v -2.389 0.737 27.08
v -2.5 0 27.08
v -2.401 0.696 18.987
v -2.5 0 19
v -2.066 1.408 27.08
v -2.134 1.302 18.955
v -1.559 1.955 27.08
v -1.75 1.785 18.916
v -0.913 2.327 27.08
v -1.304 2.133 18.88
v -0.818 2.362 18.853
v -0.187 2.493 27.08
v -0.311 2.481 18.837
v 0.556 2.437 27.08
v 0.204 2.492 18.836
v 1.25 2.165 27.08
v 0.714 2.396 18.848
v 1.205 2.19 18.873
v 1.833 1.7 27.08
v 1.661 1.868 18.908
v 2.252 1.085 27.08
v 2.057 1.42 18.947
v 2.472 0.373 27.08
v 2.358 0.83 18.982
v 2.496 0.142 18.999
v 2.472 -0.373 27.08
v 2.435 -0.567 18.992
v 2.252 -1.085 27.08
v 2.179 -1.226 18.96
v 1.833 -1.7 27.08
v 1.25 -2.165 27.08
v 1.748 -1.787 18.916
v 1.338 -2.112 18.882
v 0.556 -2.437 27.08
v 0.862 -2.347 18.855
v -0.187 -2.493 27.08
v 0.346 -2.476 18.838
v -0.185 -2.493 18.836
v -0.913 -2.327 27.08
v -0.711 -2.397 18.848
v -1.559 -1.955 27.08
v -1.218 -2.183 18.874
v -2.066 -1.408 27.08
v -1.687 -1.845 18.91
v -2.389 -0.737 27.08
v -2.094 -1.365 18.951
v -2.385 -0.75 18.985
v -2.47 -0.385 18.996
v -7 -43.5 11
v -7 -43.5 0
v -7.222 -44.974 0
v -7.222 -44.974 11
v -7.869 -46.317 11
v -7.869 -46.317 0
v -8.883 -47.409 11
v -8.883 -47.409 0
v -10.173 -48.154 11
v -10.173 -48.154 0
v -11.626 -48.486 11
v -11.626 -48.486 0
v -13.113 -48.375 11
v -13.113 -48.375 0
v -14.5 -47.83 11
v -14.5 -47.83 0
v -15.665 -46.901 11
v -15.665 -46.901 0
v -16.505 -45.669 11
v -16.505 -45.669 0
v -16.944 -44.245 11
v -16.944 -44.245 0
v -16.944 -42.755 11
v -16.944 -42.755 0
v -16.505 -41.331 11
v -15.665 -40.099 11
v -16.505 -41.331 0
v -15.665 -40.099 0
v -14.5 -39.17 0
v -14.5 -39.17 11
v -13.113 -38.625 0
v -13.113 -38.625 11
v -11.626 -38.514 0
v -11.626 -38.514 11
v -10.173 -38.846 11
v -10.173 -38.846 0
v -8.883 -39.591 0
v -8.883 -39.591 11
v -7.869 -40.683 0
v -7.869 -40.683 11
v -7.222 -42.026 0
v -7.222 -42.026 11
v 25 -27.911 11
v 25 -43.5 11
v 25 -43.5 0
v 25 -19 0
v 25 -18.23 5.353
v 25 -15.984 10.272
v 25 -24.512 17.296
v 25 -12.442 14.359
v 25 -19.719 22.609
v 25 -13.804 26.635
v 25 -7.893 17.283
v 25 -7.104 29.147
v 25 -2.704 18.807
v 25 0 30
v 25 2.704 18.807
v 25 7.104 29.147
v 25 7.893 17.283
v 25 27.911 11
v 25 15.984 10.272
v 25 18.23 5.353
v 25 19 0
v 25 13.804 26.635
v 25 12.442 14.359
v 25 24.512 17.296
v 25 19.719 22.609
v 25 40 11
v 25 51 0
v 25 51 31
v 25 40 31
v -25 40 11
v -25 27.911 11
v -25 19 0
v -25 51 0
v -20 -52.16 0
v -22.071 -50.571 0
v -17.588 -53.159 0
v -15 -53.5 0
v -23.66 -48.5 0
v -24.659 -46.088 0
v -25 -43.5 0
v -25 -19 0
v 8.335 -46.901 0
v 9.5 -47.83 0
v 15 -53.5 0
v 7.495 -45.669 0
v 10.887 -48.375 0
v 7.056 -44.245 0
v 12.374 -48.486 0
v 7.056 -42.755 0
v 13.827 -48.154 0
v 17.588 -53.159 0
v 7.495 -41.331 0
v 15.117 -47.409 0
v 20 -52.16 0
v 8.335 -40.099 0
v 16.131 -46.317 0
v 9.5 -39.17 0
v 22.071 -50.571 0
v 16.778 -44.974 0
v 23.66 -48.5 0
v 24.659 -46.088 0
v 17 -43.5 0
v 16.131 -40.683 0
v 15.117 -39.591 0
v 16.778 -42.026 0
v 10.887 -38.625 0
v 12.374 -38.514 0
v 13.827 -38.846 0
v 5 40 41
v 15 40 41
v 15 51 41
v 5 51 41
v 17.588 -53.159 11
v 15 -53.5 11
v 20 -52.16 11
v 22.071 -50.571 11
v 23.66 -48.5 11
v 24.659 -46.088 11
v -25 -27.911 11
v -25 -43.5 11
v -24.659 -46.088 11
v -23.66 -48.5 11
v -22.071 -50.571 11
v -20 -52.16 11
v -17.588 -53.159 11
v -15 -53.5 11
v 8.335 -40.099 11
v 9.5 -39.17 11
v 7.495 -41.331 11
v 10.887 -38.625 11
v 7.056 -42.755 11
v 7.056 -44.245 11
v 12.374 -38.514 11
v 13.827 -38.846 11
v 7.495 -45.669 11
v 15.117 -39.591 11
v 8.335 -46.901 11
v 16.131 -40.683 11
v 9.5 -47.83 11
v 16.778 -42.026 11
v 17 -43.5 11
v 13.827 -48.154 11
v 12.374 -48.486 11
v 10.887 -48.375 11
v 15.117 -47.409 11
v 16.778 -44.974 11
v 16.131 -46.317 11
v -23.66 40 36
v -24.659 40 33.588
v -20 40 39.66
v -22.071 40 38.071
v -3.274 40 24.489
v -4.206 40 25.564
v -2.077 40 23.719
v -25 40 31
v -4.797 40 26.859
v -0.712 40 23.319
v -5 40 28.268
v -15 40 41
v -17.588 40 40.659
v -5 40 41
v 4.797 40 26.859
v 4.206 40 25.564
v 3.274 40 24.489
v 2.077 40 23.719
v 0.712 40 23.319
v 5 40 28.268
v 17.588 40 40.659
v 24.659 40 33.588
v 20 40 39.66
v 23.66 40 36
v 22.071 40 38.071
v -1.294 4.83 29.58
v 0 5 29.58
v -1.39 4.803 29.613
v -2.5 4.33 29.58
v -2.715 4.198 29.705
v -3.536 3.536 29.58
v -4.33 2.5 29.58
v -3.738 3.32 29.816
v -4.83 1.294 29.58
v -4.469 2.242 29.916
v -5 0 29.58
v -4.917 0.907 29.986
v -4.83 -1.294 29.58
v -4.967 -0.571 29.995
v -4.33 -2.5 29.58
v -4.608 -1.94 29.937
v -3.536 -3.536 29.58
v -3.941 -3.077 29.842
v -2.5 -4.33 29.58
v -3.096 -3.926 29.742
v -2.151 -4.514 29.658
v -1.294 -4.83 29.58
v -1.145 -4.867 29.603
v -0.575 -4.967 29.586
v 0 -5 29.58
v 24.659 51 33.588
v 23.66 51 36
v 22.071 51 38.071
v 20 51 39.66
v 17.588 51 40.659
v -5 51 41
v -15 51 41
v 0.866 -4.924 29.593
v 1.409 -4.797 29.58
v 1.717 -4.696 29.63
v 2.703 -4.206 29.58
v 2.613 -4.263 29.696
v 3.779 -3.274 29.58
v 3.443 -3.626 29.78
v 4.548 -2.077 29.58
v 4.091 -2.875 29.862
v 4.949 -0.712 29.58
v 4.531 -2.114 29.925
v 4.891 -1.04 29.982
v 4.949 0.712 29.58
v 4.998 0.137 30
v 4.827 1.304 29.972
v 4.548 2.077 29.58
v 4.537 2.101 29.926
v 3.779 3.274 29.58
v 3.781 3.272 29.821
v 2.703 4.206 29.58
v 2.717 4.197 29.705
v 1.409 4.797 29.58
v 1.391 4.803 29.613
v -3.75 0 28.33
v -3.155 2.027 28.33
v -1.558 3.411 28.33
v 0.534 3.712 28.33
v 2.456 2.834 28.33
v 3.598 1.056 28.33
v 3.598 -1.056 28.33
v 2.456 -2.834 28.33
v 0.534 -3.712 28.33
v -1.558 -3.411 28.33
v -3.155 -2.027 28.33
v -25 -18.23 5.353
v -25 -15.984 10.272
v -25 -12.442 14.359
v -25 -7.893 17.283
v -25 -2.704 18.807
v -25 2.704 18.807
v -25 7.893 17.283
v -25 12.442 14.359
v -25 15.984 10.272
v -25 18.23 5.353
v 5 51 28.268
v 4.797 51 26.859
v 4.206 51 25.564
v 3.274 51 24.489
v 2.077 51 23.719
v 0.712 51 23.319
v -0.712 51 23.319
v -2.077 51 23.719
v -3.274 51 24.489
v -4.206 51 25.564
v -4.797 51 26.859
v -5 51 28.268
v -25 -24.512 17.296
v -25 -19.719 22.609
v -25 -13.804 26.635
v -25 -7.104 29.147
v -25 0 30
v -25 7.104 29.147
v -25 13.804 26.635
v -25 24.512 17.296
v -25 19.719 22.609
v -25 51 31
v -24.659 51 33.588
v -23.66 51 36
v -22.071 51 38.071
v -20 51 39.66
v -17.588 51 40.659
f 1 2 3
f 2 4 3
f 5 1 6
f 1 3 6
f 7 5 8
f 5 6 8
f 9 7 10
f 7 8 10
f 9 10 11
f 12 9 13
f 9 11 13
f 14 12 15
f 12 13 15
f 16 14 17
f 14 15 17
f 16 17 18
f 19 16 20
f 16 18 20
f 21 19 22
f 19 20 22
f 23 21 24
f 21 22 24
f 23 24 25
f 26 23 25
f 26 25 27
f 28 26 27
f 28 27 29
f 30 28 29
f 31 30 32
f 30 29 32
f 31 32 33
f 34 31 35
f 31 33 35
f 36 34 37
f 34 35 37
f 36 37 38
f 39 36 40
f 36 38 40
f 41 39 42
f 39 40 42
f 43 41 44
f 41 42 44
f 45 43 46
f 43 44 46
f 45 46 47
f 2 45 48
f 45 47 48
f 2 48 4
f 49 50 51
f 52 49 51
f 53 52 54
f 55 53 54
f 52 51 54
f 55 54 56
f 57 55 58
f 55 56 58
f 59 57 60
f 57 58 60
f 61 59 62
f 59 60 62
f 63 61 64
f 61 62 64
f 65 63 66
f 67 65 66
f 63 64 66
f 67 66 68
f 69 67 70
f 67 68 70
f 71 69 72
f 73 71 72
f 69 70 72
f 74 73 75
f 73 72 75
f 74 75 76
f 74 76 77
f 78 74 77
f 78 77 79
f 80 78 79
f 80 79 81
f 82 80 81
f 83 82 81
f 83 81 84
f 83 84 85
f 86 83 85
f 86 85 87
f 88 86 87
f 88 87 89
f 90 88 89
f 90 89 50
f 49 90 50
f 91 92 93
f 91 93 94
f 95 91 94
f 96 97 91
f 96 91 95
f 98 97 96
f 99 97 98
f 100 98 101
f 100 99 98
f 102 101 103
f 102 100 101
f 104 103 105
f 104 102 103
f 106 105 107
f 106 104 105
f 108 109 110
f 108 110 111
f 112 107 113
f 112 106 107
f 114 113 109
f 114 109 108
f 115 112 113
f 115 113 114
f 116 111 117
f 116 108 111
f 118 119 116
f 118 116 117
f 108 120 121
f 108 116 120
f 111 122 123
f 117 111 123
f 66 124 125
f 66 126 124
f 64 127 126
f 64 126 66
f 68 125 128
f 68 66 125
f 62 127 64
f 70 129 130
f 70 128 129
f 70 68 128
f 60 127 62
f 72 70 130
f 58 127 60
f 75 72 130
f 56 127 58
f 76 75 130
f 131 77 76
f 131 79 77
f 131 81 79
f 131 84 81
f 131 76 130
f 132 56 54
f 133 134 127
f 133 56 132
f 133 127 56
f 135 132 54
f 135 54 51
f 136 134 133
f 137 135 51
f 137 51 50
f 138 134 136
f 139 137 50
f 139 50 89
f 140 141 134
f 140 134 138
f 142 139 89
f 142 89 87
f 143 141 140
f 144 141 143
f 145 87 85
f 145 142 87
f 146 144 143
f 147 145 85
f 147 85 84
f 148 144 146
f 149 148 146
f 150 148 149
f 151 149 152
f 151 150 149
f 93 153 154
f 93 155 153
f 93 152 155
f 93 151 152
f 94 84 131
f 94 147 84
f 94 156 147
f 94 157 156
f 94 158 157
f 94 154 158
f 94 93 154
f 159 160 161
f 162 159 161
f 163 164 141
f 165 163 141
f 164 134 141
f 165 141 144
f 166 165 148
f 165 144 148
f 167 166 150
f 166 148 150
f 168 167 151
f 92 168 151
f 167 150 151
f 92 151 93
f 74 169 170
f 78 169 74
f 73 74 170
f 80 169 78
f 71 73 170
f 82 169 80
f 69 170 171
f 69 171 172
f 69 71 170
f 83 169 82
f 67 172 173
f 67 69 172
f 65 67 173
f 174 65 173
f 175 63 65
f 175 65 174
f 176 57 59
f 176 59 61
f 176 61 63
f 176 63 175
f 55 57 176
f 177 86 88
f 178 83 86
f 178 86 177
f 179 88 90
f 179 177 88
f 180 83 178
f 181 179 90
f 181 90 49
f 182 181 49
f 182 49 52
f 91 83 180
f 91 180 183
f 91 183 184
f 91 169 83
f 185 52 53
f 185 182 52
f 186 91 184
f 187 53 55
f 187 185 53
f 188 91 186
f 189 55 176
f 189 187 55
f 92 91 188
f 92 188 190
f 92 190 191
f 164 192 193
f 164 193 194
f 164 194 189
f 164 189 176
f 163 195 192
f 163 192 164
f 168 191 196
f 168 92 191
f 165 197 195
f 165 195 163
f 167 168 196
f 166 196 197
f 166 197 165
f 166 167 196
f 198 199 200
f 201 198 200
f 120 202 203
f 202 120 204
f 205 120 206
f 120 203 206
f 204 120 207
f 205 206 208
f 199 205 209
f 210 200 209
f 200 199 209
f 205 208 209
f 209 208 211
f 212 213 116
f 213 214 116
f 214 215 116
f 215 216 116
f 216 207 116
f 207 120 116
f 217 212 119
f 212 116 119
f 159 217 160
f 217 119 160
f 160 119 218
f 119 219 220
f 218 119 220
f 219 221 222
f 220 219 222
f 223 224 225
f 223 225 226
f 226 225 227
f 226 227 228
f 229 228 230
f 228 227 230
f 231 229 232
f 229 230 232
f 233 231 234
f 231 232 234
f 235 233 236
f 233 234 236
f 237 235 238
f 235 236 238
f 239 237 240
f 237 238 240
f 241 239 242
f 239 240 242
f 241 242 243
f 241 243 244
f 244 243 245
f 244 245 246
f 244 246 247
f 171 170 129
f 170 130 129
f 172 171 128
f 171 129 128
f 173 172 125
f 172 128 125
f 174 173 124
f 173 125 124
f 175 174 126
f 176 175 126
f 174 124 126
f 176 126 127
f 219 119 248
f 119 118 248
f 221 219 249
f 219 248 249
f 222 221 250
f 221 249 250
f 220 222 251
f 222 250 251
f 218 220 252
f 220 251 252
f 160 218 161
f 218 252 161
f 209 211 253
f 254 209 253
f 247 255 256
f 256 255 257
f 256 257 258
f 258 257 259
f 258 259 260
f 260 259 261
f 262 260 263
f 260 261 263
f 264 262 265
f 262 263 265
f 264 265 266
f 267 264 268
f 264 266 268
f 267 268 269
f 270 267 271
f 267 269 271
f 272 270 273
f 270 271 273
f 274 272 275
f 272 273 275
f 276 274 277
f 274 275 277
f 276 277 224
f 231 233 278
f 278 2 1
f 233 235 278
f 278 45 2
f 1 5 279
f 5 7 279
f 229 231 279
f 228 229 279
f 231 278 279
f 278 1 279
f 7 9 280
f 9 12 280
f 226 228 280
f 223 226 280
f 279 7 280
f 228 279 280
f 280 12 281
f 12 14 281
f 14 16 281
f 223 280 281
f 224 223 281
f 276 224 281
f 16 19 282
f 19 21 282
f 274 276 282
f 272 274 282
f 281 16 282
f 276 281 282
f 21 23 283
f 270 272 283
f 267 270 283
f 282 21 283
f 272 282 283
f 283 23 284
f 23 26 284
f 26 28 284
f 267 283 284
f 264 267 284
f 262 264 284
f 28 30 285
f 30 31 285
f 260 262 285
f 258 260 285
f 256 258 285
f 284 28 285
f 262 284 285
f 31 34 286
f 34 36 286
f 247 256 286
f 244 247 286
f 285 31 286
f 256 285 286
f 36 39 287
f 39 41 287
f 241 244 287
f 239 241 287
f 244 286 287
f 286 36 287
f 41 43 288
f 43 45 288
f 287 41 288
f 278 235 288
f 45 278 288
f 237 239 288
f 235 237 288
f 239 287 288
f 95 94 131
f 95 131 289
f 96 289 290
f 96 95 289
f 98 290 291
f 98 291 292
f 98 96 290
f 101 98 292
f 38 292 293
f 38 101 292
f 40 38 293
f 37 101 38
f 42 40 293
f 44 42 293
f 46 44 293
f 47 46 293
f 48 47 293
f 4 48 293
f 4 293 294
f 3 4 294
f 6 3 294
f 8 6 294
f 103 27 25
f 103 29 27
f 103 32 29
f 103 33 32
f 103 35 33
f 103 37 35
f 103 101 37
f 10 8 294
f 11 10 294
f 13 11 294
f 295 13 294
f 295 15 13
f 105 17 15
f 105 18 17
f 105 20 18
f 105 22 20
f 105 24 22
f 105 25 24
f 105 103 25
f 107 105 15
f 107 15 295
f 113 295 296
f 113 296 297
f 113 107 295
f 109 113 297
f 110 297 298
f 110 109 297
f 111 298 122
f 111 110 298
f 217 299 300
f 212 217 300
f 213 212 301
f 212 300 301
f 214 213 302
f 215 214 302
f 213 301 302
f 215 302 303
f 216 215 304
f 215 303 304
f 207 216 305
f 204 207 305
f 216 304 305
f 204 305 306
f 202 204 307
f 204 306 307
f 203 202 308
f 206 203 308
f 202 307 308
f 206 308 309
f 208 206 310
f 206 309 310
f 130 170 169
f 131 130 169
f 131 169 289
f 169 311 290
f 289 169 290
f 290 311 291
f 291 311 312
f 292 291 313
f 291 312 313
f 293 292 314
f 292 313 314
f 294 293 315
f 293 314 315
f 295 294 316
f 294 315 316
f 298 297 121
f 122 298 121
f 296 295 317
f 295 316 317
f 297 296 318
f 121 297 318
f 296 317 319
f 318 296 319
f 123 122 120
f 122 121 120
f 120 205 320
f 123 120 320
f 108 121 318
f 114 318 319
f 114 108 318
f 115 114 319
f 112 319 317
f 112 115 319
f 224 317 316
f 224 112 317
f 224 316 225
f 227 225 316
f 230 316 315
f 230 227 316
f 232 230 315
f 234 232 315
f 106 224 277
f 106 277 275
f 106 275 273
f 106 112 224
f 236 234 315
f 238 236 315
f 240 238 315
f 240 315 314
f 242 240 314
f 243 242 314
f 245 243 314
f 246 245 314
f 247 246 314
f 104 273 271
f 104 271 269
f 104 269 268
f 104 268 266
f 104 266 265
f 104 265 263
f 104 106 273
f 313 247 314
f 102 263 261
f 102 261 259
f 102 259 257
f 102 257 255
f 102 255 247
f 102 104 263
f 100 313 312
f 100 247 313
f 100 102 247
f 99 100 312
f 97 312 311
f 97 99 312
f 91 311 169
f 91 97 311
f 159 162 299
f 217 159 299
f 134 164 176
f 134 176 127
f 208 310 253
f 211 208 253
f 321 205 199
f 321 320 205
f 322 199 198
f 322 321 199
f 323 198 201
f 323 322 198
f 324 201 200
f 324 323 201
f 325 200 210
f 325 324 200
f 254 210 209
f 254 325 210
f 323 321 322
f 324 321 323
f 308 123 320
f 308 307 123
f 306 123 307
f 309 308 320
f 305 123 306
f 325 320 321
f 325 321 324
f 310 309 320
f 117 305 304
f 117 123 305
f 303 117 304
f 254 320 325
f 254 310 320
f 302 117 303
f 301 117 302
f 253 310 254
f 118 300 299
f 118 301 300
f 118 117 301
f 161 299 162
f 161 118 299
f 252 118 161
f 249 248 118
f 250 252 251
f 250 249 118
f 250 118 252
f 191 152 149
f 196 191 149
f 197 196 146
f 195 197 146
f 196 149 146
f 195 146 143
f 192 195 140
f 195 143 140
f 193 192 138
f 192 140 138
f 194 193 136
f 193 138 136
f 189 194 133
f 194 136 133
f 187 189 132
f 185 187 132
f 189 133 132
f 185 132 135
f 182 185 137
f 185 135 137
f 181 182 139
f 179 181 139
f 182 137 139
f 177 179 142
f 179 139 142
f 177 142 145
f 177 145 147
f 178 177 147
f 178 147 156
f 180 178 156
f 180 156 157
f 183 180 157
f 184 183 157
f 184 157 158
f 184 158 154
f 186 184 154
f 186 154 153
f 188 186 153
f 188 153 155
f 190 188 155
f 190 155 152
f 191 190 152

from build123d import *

# Parameters (mm, degrees)
F0_W           = 11
F0_H           = 30
F1_DEPTH       = 25
F1_DEPTH_BACK  = 25
F3_DEPTH       = 11
F4_R           = 10
F5_R           = 5
F6_DEPTH       = 12
F8_D           = 5
F8_START       = 11.4196012
F8_CSINK_D     = 10
F8_CSINK_ANGLE = 90


with BuildPart() as f1:
    # F0 (on Right) → F1 (new body, two sides)
    with BuildSketch(Plane.YZ) as f1_sk:
        with BuildLine():
            Line((-27.9105714739, 11), (-53.5, 11))
            Line((-53.5, 11), (-53.5, 0))
            Line((-53.5, 0), (-30, 0))
            ThreePointArc((-30, 0), (-29.4730143031, 5.5983415304), (-27.9105714739, 11))
        make_face()
        with BuildLine():
            ThreePointArc((27.9105714739, 11), (0, 30), (-27.9105714739, 11))
            ThreePointArc((-27.9105714739, 11), (-29.4730143031, 5.5983415304), (-30, 0))
            Line((-30, 0), (-19, 0))
            ThreePointArc((-19, 0), (0, 19), (19, 0))
            Line((19, 0), (30, 0))
            ThreePointArc((30, 0), (29.4730143031, 5.5983415304), (27.9105714739, 11))
        make_face()
        with BuildLine():
            Line((40, 11), (27.9105714739, 11))
            ThreePointArc((27.9105714739, 11), (29.4730143031, 5.5983415304), (30, 0))
            Line((30, 0), (51, 0))
            Line((51, 0), (51, 11))
            Line((51, 11), (40, 11))
        make_face()
        with Locations((45.5, 26)):
            Rectangle(F0_W, F0_H)
    extrude(amount=F1_DEPTH)
    extrude(f1_sk.sketch, amount=-F1_DEPTH_BACK)

    # F2 (on face) → F3 (cut)
    with BuildSketch(Plane(origin=(0, 51, 0), x_dir=(-1, 0, 0), z_dir=(0, 1, 0))):
        with BuildLine():
            Line((5, 41), (-5, 41))
            Line((-5, 41), (-5, 28.2676104225))
            ThreePointArc((-5, 28.2676104225), (0, 33.2676104225), (5, 28.2676104225))
            Line((5, 28.2676104225), (5, 41))
        make_face()
        with BuildLine():
            ThreePointArc((5, 28.2676104225), (0, 33.2676104225), (-5, 28.2676104225))
            Line((-5, 28.2676104225), (5, 28.2676104225))
        make_face()
        with BuildLine():
            Line((5, 28.2676104225), (-5, 28.2676104225))
            ThreePointArc((-5, 28.2676104225), (0, 23.2676104225), (5, 28.2676104225))
        make_face()
    extrude(amount=-F3_DEPTH, mode=Mode.SUBTRACT)

    # F4
    f4_edges = [f1.edges().sort_by_distance(p)[0] for p in [
        (25, -53.5, 5.5),
        (-25, -53.5, 5.5),
        (25, 45.5, 41),
        (-25, 45.5, 41),
    ]]
    fillet(f4_edges, radius=F4_R)

    # F5 (on face) → F6 (cut)
    with BuildSketch(Plane(origin=(0, 0, 0), x_dir=(1, 0, 0), z_dir=(0, 0, -1))):
        with Locations((-12, 43.5)):
            Circle(F5_R)
        with Locations((12, 43.5)):
            Circle(F5_R)
    extrude(amount=-F6_DEPTH, mode=Mode.SUBTRACT)

    # F8 (through all)
    # its depths count from where the whole tool has entered the part; down to there all is cleared
    with Locations(Plane.XY.offset(41).offset(-F8_START)):
        with Locations((0, 0)):
            CounterSinkHole(F8_D / 2, F8_CSINK_D / 2, counter_sink_angle=F8_CSINK_ANGLE)


solid = f1.part
